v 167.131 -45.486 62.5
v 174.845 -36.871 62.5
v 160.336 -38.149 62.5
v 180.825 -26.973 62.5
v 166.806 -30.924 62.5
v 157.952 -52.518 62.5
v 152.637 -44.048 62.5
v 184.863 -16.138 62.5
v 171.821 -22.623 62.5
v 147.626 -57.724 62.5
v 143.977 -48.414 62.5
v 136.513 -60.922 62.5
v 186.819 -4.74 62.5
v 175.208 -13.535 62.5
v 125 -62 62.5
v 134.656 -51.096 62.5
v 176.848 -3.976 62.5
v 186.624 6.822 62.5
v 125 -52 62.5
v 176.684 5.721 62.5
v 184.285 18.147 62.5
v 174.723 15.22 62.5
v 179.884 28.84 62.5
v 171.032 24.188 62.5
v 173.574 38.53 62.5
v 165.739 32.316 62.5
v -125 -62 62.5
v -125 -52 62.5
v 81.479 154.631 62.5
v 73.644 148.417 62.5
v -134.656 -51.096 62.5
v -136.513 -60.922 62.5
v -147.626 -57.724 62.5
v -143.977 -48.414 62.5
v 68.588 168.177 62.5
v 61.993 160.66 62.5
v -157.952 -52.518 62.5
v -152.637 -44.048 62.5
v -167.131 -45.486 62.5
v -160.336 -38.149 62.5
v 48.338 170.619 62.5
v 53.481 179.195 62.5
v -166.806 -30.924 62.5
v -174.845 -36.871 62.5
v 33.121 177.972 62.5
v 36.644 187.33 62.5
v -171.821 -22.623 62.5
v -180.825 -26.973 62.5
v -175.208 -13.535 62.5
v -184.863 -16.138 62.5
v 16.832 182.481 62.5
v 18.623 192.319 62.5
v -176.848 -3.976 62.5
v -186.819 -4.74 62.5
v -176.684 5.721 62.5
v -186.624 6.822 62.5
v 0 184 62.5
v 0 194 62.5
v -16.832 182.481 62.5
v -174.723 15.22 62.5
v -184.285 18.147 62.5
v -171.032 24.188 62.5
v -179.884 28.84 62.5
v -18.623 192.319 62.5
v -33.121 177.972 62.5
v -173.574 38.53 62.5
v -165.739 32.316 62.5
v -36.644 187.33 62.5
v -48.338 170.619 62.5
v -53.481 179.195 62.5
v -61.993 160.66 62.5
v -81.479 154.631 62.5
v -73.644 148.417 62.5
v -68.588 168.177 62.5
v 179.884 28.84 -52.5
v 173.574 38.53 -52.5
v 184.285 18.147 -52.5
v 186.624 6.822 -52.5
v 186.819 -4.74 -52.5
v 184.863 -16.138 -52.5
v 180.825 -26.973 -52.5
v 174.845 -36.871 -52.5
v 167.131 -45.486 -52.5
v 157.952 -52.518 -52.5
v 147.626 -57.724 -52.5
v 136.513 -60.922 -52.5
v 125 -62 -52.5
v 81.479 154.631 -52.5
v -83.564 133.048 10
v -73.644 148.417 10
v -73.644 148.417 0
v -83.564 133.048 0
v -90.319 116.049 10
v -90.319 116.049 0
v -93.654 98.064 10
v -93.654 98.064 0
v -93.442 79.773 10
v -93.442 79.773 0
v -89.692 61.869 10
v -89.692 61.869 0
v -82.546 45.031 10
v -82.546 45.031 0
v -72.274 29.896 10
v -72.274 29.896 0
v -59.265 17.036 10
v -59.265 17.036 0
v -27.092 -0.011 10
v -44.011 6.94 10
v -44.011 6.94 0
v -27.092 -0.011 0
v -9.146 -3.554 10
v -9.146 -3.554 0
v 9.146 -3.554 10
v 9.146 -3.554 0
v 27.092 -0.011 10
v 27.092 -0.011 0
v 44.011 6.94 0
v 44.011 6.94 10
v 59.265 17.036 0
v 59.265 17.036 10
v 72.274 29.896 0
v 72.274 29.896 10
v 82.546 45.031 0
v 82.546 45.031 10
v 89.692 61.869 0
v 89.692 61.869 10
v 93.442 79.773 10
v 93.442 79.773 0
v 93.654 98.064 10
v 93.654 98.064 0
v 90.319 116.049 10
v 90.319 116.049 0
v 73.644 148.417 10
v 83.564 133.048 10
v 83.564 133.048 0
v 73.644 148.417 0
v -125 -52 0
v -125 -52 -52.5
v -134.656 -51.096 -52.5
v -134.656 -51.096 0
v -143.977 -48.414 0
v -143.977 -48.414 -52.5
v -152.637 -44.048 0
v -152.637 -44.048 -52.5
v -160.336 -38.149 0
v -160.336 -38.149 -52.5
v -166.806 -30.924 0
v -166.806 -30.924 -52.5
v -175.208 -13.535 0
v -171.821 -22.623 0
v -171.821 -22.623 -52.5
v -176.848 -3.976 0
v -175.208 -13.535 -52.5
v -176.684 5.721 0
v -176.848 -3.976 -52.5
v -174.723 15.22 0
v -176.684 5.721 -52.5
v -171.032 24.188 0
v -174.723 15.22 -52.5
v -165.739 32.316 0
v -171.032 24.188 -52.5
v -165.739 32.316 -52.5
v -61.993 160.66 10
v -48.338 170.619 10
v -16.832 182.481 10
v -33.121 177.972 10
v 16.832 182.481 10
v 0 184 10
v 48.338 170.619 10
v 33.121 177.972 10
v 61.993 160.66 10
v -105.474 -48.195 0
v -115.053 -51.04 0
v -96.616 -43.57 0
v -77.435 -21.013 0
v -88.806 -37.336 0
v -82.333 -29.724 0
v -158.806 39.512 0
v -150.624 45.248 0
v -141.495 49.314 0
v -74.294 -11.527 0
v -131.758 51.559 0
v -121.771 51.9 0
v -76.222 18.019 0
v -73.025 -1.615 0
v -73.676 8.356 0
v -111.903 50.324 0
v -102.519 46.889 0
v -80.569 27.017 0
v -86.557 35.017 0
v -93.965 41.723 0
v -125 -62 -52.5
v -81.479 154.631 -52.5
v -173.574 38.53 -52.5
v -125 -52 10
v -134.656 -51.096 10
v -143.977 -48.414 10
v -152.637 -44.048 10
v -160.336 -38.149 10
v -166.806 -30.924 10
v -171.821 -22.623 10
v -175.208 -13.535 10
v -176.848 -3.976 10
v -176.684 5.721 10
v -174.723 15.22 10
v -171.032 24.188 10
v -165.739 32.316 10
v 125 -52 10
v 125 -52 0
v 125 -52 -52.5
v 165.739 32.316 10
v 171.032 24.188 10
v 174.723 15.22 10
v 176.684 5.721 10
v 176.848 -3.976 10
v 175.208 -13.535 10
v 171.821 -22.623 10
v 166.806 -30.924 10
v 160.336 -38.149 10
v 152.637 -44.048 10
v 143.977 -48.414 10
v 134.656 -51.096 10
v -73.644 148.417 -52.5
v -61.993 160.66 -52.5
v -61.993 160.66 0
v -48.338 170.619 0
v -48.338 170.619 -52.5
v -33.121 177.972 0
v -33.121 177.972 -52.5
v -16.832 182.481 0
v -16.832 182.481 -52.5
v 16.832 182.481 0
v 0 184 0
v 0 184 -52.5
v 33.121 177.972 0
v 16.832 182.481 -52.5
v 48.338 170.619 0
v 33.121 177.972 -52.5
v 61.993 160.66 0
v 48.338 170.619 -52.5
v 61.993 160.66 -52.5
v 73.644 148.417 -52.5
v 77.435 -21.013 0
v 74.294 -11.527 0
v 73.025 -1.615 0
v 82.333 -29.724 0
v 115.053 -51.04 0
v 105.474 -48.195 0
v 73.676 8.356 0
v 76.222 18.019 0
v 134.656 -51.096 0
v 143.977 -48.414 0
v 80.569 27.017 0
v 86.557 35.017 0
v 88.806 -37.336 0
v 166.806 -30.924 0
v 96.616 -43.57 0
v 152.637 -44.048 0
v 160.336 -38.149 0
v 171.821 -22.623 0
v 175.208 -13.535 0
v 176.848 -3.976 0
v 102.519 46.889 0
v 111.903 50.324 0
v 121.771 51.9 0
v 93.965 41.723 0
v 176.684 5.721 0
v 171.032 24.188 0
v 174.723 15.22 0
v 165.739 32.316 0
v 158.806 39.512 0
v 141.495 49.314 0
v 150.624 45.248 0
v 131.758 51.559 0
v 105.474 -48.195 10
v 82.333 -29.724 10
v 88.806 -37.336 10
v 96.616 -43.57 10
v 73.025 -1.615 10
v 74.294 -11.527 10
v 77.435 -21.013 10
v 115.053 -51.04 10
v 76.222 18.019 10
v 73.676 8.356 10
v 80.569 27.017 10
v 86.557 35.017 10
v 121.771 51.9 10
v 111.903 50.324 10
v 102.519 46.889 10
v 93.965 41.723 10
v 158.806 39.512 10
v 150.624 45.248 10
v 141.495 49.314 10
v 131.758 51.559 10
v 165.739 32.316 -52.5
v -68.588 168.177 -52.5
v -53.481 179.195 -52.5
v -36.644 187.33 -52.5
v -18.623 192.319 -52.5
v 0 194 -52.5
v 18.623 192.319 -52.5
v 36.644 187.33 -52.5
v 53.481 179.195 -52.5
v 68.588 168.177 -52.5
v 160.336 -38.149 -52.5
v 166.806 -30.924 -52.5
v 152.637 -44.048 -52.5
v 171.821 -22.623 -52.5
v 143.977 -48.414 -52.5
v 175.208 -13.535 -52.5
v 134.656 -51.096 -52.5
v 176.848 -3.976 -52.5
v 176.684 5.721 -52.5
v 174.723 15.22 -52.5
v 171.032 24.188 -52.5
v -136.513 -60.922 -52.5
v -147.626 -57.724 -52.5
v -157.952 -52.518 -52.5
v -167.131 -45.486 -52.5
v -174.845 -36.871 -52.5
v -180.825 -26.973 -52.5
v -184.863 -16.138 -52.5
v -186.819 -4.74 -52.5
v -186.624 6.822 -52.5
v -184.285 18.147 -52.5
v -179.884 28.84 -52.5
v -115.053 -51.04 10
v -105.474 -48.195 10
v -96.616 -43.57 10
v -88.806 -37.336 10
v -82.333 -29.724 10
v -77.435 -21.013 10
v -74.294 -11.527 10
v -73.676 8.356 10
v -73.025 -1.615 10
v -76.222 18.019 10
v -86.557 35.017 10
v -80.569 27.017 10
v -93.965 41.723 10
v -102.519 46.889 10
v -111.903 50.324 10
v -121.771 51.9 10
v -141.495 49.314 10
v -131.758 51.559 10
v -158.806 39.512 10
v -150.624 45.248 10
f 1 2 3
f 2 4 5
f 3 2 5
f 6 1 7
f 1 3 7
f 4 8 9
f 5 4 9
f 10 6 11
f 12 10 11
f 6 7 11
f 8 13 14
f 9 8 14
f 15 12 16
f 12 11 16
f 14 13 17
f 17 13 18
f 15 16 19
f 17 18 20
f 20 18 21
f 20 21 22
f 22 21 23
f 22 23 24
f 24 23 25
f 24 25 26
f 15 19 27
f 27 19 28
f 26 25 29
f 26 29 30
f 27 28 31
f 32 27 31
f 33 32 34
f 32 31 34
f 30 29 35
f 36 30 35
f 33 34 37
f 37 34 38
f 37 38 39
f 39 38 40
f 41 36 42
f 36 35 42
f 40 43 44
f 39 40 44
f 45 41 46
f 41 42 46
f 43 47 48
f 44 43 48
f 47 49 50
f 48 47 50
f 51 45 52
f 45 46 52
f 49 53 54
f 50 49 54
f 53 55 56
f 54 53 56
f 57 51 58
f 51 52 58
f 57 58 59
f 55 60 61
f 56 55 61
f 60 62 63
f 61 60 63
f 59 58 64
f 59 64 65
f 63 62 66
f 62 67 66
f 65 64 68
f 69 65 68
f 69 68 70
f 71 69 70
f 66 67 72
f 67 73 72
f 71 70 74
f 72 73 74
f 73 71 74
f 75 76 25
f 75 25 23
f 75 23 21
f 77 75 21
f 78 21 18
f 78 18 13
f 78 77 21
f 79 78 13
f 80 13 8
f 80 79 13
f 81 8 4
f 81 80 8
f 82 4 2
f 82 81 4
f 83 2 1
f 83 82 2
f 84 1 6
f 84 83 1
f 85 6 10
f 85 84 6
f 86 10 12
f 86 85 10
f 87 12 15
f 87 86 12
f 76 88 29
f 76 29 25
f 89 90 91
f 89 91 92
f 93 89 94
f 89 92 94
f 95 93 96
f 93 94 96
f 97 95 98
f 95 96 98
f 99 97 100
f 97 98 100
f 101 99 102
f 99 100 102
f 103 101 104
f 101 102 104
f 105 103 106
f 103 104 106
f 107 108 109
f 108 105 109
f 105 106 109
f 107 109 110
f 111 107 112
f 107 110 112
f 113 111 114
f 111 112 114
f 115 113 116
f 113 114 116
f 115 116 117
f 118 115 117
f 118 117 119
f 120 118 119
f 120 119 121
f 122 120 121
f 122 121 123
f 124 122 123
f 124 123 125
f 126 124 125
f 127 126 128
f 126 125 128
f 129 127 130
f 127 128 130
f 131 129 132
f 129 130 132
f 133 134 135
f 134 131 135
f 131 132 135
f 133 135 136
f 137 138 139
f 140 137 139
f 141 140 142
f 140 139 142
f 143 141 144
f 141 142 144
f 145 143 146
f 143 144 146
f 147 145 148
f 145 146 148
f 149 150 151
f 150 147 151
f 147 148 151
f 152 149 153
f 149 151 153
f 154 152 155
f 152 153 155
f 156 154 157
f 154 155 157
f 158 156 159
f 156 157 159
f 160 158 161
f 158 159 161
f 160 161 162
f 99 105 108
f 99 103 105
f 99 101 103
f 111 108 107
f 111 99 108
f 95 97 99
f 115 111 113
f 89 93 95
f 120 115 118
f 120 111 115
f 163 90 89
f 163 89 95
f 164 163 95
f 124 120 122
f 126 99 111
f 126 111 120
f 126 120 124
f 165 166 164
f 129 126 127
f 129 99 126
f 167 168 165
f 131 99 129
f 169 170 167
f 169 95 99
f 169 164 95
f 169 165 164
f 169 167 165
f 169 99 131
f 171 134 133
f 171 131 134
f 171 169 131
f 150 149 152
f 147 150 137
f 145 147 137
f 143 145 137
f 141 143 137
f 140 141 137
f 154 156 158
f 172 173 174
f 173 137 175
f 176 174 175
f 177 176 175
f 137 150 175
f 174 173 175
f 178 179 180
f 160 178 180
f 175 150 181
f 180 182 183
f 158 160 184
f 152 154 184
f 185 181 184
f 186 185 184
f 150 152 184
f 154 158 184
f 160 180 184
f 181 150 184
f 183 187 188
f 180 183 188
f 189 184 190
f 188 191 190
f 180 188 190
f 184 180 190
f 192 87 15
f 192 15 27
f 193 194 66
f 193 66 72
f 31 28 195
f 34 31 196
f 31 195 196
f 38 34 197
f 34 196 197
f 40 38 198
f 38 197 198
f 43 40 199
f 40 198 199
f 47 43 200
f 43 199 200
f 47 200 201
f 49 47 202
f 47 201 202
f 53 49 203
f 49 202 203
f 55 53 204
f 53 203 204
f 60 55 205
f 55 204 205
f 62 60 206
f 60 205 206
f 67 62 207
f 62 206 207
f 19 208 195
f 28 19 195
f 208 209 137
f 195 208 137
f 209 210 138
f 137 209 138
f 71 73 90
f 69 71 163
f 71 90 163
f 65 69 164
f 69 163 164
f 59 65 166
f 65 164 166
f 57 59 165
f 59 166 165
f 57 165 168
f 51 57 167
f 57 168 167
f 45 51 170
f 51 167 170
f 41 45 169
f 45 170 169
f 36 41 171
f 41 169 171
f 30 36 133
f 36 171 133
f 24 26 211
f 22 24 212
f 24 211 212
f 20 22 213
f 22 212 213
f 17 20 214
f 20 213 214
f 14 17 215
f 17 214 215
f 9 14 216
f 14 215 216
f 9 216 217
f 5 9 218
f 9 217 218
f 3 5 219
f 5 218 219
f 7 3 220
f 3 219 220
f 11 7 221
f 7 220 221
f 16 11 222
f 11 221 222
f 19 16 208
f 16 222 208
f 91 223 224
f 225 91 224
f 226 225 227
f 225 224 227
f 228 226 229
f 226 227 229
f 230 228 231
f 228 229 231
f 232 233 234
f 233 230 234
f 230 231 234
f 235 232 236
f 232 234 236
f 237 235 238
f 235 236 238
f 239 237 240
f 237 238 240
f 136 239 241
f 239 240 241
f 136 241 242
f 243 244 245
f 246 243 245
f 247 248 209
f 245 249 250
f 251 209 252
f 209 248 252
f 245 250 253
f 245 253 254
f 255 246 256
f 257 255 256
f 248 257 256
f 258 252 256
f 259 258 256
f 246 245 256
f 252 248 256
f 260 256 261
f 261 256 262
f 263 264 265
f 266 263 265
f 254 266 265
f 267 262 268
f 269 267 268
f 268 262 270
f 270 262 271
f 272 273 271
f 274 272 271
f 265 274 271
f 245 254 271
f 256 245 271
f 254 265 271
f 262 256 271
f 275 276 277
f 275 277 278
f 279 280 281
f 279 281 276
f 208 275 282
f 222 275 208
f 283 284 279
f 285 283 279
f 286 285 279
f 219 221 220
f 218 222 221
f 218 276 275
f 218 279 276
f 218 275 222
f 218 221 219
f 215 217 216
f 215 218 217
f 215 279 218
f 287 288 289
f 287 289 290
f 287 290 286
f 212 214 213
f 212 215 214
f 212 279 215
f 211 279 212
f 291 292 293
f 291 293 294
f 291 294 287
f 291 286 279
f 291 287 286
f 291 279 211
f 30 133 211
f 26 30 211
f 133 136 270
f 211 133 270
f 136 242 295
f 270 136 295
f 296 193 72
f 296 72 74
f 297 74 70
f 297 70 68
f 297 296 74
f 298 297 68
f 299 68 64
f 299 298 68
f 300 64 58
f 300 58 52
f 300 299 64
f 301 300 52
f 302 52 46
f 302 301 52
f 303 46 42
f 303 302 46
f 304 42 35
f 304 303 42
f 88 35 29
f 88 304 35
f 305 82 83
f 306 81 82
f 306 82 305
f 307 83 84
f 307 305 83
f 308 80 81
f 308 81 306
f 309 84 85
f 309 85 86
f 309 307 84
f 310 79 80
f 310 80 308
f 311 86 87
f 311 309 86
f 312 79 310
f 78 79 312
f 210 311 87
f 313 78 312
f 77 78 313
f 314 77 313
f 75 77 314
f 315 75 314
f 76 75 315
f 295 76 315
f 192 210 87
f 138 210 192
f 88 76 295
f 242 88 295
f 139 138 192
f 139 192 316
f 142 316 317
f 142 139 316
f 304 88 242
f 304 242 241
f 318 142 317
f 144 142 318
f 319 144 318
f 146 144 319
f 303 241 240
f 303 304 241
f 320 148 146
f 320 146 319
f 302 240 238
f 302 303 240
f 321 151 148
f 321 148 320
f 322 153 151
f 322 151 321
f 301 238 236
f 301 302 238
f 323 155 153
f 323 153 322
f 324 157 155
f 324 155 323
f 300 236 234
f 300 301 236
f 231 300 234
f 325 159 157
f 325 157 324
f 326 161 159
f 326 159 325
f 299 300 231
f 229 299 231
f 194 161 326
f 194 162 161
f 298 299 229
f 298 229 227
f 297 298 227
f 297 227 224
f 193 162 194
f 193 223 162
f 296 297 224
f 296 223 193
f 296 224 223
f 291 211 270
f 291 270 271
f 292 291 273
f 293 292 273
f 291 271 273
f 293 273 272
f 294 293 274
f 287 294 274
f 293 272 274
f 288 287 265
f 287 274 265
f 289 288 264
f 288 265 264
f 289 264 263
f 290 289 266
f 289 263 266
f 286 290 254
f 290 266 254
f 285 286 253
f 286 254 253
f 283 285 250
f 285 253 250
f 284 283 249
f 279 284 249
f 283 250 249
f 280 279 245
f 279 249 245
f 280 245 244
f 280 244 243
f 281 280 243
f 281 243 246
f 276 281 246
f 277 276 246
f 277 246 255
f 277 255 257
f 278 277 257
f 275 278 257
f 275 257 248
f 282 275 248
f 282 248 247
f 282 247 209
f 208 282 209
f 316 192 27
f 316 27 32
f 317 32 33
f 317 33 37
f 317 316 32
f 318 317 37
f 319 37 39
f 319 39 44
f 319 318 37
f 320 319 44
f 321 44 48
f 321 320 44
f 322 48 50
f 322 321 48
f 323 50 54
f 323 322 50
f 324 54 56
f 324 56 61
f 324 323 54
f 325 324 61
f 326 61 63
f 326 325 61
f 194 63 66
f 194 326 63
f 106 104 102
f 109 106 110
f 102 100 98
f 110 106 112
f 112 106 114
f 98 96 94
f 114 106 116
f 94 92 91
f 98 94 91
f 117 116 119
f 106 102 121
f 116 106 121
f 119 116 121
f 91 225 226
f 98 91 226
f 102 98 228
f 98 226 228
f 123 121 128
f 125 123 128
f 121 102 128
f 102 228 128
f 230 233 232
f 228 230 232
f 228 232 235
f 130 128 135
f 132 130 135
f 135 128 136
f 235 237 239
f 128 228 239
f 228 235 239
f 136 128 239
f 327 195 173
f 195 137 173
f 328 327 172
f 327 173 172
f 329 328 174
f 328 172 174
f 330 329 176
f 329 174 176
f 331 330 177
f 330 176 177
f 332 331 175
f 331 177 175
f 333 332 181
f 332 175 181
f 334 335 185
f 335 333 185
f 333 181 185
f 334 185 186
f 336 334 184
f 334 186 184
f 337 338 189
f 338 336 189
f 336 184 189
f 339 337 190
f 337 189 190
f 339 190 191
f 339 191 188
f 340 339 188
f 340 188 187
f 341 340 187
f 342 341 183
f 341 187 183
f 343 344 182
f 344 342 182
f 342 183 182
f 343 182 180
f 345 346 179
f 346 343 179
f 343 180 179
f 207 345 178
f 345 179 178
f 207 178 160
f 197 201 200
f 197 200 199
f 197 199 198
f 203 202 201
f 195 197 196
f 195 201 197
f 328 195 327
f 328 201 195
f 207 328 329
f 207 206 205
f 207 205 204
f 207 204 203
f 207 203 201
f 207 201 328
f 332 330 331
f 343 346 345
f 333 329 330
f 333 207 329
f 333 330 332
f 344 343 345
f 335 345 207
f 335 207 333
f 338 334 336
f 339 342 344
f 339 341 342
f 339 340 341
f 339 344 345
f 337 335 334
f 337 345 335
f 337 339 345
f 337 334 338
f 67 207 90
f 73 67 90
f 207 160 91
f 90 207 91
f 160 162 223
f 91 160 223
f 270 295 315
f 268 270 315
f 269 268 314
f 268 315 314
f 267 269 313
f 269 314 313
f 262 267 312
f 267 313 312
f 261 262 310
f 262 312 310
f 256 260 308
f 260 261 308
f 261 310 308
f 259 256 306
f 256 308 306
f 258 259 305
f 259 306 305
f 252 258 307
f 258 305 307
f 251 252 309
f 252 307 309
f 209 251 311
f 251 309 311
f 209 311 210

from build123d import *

# Parameters (mm, degrees)
SCHIZZO1_R                     = 52
ESTRUSIONE_ESTRUSIONE1_DEPTH   = 10
ESTRUSIONE_ESTRUSIONE1_2_DEPTH = 10
SCHIZZO1_R_2                   = 94
ESTRUSIONE_ESTRUSIONE1_3_DEPTH = 10
ESTRUSIONE_SOTTILE1_DEPTH      = 52.5
ESTRUSIONE_SOTTILE1_DEPTH_BACK = 62.5


with BuildPart() as part:
    # Schizzo1 → Estrusione-Estrusione1 (new body)
    with BuildSketch(Plane.XY):
        with Locations((-125, 0)):
            Circle(SCHIZZO1_R)
    extrude(amount=ESTRUSIONE_ESTRUSIONE1_DEPTH)



with BuildPart() as body_2:
    # Schizzo1 → Estrusione-Estrusione1 2 (new body)
    with BuildSketch(Plane.XY):
        with Locations((125, 0)):
            Circle(SCHIZZO1_R)
    extrude(amount=ESTRUSIONE_ESTRUSIONE1_2_DEPTH)


with BuildPart() as body_3:
    # Schizzo1 → Estrusione-Estrusione1 3 (new body)
    with BuildSketch(Plane.XY):
        with Locations((0, 90)):
            Circle(SCHIZZO1_R_2)
    extrude(amount=ESTRUSIONE_ESTRUSIONE1_3_DEPTH)


with BuildPart() as part_1:
    add(part.part)

    add(body_2.part)  # Estrusione-Sottile1 merges body 2

    add(body_3.part)  # Estrusione-Sottile1 merges body 3
    # Schizzo2 → Estrusione-Sottile1 (add, two sides: drawn at the far end of the back side and taken through both)
    with BuildSketch(Plane.XY.offset(10).offset(-ESTRUSIONE_SOTTILE1_DEPTH_BACK)):
        with BuildLine():
            Line((81.478662228, 154.631475316), (173.573817867, 38.530302592))
            ThreePointArc((173.573817867, 38.530302592), (180.825078418, -26.973331638), (125, -62))
            Line((125, -62), (-125, -62))
            ThreePointArc((-125, -62), (-180.825078418, -26.973331638), (-173.573817867, 38.530302592))
            Line((-173.573817867, 38.530302592), (-81.478662228, 154.631475316))
            ThreePointArc((-81.478662228, 154.631475316), (0, 194), (81.478662228, 154.631475316))
        make_face()
        with BuildLine():
            Line((73.644175475, 148.416910382), (165.739331114, 32.315737658))
            ThreePointArc((165.739331114, 32.315737658), (171.821033512, -22.622794277), (125, -52))
            Line((125, -52), (-125, -52))
            ThreePointArc((-125, -52), (-171.821033512, -22.622794277), (-165.739331114, 32.315737658))
            Line((-165.739331114, 32.315737658), (-73.644175475, 148.416910382))
            ThreePointArc((-73.644175475, 148.416910382), (0, 184), (73.644175475, 148.416910382))
        make_face(mode=Mode.SUBTRACT)
    extrude(amount=ESTRUSIONE_SOTTILE1_DEPTH + ESTRUSIONE_SOTTILE1_DEPTH_BACK)


solid = part_1.part
